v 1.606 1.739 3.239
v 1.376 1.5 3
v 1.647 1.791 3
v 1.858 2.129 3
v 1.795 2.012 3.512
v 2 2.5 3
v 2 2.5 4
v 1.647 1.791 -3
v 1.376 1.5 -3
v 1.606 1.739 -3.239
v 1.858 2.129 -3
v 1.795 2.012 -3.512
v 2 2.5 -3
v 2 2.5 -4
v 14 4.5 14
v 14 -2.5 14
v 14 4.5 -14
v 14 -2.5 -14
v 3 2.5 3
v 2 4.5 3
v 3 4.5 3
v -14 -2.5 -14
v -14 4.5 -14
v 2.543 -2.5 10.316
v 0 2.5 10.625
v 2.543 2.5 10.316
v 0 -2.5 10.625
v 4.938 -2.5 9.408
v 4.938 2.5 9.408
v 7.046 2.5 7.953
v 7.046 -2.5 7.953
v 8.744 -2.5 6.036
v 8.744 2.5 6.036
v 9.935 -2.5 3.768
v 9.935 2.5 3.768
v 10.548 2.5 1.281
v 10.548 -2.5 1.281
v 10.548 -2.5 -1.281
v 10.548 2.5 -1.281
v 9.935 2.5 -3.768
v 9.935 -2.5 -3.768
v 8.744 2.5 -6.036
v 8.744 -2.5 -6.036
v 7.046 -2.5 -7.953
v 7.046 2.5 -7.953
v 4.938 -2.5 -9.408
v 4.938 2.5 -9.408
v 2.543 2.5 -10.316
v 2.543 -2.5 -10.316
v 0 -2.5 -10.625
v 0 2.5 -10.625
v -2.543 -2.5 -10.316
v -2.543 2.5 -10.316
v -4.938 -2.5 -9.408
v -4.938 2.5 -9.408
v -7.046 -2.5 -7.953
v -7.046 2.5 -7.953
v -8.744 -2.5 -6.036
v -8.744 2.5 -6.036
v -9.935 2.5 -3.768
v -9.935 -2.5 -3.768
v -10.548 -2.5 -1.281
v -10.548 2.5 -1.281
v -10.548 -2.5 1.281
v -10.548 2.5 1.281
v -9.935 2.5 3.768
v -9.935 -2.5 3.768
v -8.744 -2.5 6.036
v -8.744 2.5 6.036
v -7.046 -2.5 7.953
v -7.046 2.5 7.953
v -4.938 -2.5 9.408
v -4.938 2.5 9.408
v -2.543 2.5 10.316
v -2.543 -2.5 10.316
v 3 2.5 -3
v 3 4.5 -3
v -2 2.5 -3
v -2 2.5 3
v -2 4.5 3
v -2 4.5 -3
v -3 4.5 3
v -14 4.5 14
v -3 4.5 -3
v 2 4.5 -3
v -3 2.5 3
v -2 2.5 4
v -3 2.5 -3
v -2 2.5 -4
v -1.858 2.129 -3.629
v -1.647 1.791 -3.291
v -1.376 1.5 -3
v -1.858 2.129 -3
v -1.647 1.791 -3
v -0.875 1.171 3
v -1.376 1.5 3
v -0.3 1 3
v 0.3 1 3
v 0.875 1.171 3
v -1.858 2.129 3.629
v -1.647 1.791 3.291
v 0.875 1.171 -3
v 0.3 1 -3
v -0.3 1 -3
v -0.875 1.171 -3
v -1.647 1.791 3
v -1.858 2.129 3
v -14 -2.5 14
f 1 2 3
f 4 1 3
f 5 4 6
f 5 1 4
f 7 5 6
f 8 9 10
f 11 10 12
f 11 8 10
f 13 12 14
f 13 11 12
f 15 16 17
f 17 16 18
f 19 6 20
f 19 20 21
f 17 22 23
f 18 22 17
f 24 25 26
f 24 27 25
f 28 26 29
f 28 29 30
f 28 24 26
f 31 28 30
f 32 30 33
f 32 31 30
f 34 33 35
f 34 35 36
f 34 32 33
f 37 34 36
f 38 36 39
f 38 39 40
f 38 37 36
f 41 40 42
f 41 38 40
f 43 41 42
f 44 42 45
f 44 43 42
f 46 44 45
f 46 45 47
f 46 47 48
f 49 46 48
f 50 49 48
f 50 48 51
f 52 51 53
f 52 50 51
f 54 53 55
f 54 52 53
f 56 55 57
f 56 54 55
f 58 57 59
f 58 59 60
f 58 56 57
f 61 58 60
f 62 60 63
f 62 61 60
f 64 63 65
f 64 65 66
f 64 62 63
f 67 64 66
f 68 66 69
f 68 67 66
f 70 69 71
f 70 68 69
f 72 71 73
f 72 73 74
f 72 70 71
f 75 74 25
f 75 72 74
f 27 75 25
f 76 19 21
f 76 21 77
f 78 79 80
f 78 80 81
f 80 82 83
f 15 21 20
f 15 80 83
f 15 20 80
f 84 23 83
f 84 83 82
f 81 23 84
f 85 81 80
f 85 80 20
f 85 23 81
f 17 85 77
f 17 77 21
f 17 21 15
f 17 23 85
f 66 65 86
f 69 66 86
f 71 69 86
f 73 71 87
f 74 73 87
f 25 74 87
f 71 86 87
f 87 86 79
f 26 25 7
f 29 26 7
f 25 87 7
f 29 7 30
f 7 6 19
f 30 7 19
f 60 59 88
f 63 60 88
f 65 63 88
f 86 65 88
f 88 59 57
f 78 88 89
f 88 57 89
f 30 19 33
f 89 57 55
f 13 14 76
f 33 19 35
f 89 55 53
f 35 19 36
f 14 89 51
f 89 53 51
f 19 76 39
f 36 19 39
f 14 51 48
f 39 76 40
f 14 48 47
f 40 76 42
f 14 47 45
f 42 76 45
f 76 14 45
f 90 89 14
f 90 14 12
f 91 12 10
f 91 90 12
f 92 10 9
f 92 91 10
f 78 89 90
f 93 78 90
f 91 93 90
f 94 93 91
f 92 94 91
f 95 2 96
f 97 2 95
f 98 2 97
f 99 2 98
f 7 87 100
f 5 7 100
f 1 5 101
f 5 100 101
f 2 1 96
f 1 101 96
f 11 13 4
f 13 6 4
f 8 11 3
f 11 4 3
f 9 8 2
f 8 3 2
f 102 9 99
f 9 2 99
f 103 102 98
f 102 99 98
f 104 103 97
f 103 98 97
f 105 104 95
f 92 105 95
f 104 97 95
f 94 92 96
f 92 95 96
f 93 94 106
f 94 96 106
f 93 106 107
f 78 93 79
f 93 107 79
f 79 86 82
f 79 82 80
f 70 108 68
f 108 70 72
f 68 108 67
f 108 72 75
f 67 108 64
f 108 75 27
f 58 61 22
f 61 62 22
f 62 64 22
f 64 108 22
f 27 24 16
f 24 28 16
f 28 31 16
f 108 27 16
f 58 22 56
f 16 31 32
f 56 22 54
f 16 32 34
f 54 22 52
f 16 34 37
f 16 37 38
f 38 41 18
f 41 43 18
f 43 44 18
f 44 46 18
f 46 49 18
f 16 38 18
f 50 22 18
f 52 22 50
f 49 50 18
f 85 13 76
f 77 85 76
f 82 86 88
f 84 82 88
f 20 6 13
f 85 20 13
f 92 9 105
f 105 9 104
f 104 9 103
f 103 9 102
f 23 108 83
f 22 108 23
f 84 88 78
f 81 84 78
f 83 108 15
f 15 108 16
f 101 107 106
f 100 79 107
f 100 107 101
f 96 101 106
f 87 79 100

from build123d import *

# Parameters (mm, degrees)
SKETCH1_W           = 28
SKETCH1_H           = 28
SKETCH1_R           = 10.625
BOSS_EXTRUDE1_DEPTH = 2.5
SKETCH2_W           = 28
SKETCH2_H           = 28
SKETCH2_W_2         = 1
SKETCH2_H_2         = 6
BOSS_EXTRUDE2_DEPTH = 2
BOSS_EXTRUDE3_DEPTH = 3
CHAMFER1_SIZE       = 1


with BuildPart() as part:
    # Sketch1 → Boss-Extrude1 (new, symmetric)
    with BuildSketch(Plane(origin=(0, 0, 0), x_dir=(1, 0, 0), z_dir=(0, 1, 0))):
        Rectangle(SKETCH1_W, SKETCH1_H)
        with Locations(Location((0, 0, 0), (0, 0, 270))):
            Circle(SKETCH1_R, mode=Mode.SUBTRACT)
    extrude(amount=BOSS_EXTRUDE1_DEPTH, both=True)

    # Sketch2 → Boss-Extrude2 (add)
    with BuildSketch(Plane(origin=(0, 2.5, 0), x_dir=(1, 0, 0), z_dir=(0, 1, 0))):
        Rectangle(SKETCH2_W, SKETCH2_H)
        with Locations((-2.5, 0)):
            Rectangle(SKETCH2_W_2, SKETCH2_H_2, mode=Mode.SUBTRACT)
        with Locations((2.5, 0)):
            Rectangle(SKETCH2_W_2, SKETCH2_H_2, mode=Mode.SUBTRACT)
    extrude(amount=BOSS_EXTRUDE2_DEPTH)

    # Sketch3 → Boss-Extrude3 (add, symmetric)
    with BuildSketch(Plane.XY):
        with BuildLine():
            Line((-2, 2.5), (2, 2.5))
            ThreePointArc((2, 2.5), (0, 0.97783361), (-2, 2.5))
        make_face()
    extrude(amount=BOSS_EXTRUDE3_DEPTH, both=True)

    # Chamfer1
    # the kernel refuses this chamfer: 1 mm, written as the material it adds along each edge
    with BuildSketch(Plane(origin=(-4.571682988, 2.5, -3), x_dir=(0, 0.027495876610586487, -0.9996219169112968), z_dir=(1, 0, 0))) as chamfer1_piece_1_section:
        Polygon((CHAMFER1_SIZE * 0.999621916911, -CHAMFER1_SIZE * 0.0274958766106), (-CHAMFER1_SIZE * 0.0274958766106, -CHAMFER1_SIZE * 0.999621916911), (0, 0), align=None)
    chamfer1_piece_1 = extrude(amount=9.143365976, mode=Mode.PRIVATE)
    chamfer1_piece_1 = chamfer1_piece_1 & Plane(origin=(0, 3.05283361, -3.341258545), x_dir=(0.9638554216867474, -0.266425835993926, 0), z_dir=(0, 0, 1)) * Cylinder(2.075, 23, mode=Mode.PRIVATE)
    add(chamfer1_piece_1)
    with BuildSketch(Plane(origin=(-4.571682988, 2.5, 3), x_dir=(0, 0.027495876610586487, 0.9996219169112968), z_dir=(1, 0, 0))) as chamfer1_piece_2_section:
        Polygon((CHAMFER1_SIZE * 0.999621916911, CHAMFER1_SIZE * 0.0274958766106), (-CHAMFER1_SIZE * 0.0274958766106, CHAMFER1_SIZE * 0.999621916911), (0, 0), align=None)
    chamfer1_piece_2 = extrude(amount=9.143365976, mode=Mode.PRIVATE)
    chamfer1_piece_2 = chamfer1_piece_2 & Plane(origin=(0, 3.05283361, 3.341258545), x_dir=(0.9638554216867474, -0.266425835993926, 0), z_dir=(0, 0, 1)) * Cylinder(2.075, 23, mode=Mode.PRIVATE)
    add(chamfer1_piece_2)


solid = part.part
